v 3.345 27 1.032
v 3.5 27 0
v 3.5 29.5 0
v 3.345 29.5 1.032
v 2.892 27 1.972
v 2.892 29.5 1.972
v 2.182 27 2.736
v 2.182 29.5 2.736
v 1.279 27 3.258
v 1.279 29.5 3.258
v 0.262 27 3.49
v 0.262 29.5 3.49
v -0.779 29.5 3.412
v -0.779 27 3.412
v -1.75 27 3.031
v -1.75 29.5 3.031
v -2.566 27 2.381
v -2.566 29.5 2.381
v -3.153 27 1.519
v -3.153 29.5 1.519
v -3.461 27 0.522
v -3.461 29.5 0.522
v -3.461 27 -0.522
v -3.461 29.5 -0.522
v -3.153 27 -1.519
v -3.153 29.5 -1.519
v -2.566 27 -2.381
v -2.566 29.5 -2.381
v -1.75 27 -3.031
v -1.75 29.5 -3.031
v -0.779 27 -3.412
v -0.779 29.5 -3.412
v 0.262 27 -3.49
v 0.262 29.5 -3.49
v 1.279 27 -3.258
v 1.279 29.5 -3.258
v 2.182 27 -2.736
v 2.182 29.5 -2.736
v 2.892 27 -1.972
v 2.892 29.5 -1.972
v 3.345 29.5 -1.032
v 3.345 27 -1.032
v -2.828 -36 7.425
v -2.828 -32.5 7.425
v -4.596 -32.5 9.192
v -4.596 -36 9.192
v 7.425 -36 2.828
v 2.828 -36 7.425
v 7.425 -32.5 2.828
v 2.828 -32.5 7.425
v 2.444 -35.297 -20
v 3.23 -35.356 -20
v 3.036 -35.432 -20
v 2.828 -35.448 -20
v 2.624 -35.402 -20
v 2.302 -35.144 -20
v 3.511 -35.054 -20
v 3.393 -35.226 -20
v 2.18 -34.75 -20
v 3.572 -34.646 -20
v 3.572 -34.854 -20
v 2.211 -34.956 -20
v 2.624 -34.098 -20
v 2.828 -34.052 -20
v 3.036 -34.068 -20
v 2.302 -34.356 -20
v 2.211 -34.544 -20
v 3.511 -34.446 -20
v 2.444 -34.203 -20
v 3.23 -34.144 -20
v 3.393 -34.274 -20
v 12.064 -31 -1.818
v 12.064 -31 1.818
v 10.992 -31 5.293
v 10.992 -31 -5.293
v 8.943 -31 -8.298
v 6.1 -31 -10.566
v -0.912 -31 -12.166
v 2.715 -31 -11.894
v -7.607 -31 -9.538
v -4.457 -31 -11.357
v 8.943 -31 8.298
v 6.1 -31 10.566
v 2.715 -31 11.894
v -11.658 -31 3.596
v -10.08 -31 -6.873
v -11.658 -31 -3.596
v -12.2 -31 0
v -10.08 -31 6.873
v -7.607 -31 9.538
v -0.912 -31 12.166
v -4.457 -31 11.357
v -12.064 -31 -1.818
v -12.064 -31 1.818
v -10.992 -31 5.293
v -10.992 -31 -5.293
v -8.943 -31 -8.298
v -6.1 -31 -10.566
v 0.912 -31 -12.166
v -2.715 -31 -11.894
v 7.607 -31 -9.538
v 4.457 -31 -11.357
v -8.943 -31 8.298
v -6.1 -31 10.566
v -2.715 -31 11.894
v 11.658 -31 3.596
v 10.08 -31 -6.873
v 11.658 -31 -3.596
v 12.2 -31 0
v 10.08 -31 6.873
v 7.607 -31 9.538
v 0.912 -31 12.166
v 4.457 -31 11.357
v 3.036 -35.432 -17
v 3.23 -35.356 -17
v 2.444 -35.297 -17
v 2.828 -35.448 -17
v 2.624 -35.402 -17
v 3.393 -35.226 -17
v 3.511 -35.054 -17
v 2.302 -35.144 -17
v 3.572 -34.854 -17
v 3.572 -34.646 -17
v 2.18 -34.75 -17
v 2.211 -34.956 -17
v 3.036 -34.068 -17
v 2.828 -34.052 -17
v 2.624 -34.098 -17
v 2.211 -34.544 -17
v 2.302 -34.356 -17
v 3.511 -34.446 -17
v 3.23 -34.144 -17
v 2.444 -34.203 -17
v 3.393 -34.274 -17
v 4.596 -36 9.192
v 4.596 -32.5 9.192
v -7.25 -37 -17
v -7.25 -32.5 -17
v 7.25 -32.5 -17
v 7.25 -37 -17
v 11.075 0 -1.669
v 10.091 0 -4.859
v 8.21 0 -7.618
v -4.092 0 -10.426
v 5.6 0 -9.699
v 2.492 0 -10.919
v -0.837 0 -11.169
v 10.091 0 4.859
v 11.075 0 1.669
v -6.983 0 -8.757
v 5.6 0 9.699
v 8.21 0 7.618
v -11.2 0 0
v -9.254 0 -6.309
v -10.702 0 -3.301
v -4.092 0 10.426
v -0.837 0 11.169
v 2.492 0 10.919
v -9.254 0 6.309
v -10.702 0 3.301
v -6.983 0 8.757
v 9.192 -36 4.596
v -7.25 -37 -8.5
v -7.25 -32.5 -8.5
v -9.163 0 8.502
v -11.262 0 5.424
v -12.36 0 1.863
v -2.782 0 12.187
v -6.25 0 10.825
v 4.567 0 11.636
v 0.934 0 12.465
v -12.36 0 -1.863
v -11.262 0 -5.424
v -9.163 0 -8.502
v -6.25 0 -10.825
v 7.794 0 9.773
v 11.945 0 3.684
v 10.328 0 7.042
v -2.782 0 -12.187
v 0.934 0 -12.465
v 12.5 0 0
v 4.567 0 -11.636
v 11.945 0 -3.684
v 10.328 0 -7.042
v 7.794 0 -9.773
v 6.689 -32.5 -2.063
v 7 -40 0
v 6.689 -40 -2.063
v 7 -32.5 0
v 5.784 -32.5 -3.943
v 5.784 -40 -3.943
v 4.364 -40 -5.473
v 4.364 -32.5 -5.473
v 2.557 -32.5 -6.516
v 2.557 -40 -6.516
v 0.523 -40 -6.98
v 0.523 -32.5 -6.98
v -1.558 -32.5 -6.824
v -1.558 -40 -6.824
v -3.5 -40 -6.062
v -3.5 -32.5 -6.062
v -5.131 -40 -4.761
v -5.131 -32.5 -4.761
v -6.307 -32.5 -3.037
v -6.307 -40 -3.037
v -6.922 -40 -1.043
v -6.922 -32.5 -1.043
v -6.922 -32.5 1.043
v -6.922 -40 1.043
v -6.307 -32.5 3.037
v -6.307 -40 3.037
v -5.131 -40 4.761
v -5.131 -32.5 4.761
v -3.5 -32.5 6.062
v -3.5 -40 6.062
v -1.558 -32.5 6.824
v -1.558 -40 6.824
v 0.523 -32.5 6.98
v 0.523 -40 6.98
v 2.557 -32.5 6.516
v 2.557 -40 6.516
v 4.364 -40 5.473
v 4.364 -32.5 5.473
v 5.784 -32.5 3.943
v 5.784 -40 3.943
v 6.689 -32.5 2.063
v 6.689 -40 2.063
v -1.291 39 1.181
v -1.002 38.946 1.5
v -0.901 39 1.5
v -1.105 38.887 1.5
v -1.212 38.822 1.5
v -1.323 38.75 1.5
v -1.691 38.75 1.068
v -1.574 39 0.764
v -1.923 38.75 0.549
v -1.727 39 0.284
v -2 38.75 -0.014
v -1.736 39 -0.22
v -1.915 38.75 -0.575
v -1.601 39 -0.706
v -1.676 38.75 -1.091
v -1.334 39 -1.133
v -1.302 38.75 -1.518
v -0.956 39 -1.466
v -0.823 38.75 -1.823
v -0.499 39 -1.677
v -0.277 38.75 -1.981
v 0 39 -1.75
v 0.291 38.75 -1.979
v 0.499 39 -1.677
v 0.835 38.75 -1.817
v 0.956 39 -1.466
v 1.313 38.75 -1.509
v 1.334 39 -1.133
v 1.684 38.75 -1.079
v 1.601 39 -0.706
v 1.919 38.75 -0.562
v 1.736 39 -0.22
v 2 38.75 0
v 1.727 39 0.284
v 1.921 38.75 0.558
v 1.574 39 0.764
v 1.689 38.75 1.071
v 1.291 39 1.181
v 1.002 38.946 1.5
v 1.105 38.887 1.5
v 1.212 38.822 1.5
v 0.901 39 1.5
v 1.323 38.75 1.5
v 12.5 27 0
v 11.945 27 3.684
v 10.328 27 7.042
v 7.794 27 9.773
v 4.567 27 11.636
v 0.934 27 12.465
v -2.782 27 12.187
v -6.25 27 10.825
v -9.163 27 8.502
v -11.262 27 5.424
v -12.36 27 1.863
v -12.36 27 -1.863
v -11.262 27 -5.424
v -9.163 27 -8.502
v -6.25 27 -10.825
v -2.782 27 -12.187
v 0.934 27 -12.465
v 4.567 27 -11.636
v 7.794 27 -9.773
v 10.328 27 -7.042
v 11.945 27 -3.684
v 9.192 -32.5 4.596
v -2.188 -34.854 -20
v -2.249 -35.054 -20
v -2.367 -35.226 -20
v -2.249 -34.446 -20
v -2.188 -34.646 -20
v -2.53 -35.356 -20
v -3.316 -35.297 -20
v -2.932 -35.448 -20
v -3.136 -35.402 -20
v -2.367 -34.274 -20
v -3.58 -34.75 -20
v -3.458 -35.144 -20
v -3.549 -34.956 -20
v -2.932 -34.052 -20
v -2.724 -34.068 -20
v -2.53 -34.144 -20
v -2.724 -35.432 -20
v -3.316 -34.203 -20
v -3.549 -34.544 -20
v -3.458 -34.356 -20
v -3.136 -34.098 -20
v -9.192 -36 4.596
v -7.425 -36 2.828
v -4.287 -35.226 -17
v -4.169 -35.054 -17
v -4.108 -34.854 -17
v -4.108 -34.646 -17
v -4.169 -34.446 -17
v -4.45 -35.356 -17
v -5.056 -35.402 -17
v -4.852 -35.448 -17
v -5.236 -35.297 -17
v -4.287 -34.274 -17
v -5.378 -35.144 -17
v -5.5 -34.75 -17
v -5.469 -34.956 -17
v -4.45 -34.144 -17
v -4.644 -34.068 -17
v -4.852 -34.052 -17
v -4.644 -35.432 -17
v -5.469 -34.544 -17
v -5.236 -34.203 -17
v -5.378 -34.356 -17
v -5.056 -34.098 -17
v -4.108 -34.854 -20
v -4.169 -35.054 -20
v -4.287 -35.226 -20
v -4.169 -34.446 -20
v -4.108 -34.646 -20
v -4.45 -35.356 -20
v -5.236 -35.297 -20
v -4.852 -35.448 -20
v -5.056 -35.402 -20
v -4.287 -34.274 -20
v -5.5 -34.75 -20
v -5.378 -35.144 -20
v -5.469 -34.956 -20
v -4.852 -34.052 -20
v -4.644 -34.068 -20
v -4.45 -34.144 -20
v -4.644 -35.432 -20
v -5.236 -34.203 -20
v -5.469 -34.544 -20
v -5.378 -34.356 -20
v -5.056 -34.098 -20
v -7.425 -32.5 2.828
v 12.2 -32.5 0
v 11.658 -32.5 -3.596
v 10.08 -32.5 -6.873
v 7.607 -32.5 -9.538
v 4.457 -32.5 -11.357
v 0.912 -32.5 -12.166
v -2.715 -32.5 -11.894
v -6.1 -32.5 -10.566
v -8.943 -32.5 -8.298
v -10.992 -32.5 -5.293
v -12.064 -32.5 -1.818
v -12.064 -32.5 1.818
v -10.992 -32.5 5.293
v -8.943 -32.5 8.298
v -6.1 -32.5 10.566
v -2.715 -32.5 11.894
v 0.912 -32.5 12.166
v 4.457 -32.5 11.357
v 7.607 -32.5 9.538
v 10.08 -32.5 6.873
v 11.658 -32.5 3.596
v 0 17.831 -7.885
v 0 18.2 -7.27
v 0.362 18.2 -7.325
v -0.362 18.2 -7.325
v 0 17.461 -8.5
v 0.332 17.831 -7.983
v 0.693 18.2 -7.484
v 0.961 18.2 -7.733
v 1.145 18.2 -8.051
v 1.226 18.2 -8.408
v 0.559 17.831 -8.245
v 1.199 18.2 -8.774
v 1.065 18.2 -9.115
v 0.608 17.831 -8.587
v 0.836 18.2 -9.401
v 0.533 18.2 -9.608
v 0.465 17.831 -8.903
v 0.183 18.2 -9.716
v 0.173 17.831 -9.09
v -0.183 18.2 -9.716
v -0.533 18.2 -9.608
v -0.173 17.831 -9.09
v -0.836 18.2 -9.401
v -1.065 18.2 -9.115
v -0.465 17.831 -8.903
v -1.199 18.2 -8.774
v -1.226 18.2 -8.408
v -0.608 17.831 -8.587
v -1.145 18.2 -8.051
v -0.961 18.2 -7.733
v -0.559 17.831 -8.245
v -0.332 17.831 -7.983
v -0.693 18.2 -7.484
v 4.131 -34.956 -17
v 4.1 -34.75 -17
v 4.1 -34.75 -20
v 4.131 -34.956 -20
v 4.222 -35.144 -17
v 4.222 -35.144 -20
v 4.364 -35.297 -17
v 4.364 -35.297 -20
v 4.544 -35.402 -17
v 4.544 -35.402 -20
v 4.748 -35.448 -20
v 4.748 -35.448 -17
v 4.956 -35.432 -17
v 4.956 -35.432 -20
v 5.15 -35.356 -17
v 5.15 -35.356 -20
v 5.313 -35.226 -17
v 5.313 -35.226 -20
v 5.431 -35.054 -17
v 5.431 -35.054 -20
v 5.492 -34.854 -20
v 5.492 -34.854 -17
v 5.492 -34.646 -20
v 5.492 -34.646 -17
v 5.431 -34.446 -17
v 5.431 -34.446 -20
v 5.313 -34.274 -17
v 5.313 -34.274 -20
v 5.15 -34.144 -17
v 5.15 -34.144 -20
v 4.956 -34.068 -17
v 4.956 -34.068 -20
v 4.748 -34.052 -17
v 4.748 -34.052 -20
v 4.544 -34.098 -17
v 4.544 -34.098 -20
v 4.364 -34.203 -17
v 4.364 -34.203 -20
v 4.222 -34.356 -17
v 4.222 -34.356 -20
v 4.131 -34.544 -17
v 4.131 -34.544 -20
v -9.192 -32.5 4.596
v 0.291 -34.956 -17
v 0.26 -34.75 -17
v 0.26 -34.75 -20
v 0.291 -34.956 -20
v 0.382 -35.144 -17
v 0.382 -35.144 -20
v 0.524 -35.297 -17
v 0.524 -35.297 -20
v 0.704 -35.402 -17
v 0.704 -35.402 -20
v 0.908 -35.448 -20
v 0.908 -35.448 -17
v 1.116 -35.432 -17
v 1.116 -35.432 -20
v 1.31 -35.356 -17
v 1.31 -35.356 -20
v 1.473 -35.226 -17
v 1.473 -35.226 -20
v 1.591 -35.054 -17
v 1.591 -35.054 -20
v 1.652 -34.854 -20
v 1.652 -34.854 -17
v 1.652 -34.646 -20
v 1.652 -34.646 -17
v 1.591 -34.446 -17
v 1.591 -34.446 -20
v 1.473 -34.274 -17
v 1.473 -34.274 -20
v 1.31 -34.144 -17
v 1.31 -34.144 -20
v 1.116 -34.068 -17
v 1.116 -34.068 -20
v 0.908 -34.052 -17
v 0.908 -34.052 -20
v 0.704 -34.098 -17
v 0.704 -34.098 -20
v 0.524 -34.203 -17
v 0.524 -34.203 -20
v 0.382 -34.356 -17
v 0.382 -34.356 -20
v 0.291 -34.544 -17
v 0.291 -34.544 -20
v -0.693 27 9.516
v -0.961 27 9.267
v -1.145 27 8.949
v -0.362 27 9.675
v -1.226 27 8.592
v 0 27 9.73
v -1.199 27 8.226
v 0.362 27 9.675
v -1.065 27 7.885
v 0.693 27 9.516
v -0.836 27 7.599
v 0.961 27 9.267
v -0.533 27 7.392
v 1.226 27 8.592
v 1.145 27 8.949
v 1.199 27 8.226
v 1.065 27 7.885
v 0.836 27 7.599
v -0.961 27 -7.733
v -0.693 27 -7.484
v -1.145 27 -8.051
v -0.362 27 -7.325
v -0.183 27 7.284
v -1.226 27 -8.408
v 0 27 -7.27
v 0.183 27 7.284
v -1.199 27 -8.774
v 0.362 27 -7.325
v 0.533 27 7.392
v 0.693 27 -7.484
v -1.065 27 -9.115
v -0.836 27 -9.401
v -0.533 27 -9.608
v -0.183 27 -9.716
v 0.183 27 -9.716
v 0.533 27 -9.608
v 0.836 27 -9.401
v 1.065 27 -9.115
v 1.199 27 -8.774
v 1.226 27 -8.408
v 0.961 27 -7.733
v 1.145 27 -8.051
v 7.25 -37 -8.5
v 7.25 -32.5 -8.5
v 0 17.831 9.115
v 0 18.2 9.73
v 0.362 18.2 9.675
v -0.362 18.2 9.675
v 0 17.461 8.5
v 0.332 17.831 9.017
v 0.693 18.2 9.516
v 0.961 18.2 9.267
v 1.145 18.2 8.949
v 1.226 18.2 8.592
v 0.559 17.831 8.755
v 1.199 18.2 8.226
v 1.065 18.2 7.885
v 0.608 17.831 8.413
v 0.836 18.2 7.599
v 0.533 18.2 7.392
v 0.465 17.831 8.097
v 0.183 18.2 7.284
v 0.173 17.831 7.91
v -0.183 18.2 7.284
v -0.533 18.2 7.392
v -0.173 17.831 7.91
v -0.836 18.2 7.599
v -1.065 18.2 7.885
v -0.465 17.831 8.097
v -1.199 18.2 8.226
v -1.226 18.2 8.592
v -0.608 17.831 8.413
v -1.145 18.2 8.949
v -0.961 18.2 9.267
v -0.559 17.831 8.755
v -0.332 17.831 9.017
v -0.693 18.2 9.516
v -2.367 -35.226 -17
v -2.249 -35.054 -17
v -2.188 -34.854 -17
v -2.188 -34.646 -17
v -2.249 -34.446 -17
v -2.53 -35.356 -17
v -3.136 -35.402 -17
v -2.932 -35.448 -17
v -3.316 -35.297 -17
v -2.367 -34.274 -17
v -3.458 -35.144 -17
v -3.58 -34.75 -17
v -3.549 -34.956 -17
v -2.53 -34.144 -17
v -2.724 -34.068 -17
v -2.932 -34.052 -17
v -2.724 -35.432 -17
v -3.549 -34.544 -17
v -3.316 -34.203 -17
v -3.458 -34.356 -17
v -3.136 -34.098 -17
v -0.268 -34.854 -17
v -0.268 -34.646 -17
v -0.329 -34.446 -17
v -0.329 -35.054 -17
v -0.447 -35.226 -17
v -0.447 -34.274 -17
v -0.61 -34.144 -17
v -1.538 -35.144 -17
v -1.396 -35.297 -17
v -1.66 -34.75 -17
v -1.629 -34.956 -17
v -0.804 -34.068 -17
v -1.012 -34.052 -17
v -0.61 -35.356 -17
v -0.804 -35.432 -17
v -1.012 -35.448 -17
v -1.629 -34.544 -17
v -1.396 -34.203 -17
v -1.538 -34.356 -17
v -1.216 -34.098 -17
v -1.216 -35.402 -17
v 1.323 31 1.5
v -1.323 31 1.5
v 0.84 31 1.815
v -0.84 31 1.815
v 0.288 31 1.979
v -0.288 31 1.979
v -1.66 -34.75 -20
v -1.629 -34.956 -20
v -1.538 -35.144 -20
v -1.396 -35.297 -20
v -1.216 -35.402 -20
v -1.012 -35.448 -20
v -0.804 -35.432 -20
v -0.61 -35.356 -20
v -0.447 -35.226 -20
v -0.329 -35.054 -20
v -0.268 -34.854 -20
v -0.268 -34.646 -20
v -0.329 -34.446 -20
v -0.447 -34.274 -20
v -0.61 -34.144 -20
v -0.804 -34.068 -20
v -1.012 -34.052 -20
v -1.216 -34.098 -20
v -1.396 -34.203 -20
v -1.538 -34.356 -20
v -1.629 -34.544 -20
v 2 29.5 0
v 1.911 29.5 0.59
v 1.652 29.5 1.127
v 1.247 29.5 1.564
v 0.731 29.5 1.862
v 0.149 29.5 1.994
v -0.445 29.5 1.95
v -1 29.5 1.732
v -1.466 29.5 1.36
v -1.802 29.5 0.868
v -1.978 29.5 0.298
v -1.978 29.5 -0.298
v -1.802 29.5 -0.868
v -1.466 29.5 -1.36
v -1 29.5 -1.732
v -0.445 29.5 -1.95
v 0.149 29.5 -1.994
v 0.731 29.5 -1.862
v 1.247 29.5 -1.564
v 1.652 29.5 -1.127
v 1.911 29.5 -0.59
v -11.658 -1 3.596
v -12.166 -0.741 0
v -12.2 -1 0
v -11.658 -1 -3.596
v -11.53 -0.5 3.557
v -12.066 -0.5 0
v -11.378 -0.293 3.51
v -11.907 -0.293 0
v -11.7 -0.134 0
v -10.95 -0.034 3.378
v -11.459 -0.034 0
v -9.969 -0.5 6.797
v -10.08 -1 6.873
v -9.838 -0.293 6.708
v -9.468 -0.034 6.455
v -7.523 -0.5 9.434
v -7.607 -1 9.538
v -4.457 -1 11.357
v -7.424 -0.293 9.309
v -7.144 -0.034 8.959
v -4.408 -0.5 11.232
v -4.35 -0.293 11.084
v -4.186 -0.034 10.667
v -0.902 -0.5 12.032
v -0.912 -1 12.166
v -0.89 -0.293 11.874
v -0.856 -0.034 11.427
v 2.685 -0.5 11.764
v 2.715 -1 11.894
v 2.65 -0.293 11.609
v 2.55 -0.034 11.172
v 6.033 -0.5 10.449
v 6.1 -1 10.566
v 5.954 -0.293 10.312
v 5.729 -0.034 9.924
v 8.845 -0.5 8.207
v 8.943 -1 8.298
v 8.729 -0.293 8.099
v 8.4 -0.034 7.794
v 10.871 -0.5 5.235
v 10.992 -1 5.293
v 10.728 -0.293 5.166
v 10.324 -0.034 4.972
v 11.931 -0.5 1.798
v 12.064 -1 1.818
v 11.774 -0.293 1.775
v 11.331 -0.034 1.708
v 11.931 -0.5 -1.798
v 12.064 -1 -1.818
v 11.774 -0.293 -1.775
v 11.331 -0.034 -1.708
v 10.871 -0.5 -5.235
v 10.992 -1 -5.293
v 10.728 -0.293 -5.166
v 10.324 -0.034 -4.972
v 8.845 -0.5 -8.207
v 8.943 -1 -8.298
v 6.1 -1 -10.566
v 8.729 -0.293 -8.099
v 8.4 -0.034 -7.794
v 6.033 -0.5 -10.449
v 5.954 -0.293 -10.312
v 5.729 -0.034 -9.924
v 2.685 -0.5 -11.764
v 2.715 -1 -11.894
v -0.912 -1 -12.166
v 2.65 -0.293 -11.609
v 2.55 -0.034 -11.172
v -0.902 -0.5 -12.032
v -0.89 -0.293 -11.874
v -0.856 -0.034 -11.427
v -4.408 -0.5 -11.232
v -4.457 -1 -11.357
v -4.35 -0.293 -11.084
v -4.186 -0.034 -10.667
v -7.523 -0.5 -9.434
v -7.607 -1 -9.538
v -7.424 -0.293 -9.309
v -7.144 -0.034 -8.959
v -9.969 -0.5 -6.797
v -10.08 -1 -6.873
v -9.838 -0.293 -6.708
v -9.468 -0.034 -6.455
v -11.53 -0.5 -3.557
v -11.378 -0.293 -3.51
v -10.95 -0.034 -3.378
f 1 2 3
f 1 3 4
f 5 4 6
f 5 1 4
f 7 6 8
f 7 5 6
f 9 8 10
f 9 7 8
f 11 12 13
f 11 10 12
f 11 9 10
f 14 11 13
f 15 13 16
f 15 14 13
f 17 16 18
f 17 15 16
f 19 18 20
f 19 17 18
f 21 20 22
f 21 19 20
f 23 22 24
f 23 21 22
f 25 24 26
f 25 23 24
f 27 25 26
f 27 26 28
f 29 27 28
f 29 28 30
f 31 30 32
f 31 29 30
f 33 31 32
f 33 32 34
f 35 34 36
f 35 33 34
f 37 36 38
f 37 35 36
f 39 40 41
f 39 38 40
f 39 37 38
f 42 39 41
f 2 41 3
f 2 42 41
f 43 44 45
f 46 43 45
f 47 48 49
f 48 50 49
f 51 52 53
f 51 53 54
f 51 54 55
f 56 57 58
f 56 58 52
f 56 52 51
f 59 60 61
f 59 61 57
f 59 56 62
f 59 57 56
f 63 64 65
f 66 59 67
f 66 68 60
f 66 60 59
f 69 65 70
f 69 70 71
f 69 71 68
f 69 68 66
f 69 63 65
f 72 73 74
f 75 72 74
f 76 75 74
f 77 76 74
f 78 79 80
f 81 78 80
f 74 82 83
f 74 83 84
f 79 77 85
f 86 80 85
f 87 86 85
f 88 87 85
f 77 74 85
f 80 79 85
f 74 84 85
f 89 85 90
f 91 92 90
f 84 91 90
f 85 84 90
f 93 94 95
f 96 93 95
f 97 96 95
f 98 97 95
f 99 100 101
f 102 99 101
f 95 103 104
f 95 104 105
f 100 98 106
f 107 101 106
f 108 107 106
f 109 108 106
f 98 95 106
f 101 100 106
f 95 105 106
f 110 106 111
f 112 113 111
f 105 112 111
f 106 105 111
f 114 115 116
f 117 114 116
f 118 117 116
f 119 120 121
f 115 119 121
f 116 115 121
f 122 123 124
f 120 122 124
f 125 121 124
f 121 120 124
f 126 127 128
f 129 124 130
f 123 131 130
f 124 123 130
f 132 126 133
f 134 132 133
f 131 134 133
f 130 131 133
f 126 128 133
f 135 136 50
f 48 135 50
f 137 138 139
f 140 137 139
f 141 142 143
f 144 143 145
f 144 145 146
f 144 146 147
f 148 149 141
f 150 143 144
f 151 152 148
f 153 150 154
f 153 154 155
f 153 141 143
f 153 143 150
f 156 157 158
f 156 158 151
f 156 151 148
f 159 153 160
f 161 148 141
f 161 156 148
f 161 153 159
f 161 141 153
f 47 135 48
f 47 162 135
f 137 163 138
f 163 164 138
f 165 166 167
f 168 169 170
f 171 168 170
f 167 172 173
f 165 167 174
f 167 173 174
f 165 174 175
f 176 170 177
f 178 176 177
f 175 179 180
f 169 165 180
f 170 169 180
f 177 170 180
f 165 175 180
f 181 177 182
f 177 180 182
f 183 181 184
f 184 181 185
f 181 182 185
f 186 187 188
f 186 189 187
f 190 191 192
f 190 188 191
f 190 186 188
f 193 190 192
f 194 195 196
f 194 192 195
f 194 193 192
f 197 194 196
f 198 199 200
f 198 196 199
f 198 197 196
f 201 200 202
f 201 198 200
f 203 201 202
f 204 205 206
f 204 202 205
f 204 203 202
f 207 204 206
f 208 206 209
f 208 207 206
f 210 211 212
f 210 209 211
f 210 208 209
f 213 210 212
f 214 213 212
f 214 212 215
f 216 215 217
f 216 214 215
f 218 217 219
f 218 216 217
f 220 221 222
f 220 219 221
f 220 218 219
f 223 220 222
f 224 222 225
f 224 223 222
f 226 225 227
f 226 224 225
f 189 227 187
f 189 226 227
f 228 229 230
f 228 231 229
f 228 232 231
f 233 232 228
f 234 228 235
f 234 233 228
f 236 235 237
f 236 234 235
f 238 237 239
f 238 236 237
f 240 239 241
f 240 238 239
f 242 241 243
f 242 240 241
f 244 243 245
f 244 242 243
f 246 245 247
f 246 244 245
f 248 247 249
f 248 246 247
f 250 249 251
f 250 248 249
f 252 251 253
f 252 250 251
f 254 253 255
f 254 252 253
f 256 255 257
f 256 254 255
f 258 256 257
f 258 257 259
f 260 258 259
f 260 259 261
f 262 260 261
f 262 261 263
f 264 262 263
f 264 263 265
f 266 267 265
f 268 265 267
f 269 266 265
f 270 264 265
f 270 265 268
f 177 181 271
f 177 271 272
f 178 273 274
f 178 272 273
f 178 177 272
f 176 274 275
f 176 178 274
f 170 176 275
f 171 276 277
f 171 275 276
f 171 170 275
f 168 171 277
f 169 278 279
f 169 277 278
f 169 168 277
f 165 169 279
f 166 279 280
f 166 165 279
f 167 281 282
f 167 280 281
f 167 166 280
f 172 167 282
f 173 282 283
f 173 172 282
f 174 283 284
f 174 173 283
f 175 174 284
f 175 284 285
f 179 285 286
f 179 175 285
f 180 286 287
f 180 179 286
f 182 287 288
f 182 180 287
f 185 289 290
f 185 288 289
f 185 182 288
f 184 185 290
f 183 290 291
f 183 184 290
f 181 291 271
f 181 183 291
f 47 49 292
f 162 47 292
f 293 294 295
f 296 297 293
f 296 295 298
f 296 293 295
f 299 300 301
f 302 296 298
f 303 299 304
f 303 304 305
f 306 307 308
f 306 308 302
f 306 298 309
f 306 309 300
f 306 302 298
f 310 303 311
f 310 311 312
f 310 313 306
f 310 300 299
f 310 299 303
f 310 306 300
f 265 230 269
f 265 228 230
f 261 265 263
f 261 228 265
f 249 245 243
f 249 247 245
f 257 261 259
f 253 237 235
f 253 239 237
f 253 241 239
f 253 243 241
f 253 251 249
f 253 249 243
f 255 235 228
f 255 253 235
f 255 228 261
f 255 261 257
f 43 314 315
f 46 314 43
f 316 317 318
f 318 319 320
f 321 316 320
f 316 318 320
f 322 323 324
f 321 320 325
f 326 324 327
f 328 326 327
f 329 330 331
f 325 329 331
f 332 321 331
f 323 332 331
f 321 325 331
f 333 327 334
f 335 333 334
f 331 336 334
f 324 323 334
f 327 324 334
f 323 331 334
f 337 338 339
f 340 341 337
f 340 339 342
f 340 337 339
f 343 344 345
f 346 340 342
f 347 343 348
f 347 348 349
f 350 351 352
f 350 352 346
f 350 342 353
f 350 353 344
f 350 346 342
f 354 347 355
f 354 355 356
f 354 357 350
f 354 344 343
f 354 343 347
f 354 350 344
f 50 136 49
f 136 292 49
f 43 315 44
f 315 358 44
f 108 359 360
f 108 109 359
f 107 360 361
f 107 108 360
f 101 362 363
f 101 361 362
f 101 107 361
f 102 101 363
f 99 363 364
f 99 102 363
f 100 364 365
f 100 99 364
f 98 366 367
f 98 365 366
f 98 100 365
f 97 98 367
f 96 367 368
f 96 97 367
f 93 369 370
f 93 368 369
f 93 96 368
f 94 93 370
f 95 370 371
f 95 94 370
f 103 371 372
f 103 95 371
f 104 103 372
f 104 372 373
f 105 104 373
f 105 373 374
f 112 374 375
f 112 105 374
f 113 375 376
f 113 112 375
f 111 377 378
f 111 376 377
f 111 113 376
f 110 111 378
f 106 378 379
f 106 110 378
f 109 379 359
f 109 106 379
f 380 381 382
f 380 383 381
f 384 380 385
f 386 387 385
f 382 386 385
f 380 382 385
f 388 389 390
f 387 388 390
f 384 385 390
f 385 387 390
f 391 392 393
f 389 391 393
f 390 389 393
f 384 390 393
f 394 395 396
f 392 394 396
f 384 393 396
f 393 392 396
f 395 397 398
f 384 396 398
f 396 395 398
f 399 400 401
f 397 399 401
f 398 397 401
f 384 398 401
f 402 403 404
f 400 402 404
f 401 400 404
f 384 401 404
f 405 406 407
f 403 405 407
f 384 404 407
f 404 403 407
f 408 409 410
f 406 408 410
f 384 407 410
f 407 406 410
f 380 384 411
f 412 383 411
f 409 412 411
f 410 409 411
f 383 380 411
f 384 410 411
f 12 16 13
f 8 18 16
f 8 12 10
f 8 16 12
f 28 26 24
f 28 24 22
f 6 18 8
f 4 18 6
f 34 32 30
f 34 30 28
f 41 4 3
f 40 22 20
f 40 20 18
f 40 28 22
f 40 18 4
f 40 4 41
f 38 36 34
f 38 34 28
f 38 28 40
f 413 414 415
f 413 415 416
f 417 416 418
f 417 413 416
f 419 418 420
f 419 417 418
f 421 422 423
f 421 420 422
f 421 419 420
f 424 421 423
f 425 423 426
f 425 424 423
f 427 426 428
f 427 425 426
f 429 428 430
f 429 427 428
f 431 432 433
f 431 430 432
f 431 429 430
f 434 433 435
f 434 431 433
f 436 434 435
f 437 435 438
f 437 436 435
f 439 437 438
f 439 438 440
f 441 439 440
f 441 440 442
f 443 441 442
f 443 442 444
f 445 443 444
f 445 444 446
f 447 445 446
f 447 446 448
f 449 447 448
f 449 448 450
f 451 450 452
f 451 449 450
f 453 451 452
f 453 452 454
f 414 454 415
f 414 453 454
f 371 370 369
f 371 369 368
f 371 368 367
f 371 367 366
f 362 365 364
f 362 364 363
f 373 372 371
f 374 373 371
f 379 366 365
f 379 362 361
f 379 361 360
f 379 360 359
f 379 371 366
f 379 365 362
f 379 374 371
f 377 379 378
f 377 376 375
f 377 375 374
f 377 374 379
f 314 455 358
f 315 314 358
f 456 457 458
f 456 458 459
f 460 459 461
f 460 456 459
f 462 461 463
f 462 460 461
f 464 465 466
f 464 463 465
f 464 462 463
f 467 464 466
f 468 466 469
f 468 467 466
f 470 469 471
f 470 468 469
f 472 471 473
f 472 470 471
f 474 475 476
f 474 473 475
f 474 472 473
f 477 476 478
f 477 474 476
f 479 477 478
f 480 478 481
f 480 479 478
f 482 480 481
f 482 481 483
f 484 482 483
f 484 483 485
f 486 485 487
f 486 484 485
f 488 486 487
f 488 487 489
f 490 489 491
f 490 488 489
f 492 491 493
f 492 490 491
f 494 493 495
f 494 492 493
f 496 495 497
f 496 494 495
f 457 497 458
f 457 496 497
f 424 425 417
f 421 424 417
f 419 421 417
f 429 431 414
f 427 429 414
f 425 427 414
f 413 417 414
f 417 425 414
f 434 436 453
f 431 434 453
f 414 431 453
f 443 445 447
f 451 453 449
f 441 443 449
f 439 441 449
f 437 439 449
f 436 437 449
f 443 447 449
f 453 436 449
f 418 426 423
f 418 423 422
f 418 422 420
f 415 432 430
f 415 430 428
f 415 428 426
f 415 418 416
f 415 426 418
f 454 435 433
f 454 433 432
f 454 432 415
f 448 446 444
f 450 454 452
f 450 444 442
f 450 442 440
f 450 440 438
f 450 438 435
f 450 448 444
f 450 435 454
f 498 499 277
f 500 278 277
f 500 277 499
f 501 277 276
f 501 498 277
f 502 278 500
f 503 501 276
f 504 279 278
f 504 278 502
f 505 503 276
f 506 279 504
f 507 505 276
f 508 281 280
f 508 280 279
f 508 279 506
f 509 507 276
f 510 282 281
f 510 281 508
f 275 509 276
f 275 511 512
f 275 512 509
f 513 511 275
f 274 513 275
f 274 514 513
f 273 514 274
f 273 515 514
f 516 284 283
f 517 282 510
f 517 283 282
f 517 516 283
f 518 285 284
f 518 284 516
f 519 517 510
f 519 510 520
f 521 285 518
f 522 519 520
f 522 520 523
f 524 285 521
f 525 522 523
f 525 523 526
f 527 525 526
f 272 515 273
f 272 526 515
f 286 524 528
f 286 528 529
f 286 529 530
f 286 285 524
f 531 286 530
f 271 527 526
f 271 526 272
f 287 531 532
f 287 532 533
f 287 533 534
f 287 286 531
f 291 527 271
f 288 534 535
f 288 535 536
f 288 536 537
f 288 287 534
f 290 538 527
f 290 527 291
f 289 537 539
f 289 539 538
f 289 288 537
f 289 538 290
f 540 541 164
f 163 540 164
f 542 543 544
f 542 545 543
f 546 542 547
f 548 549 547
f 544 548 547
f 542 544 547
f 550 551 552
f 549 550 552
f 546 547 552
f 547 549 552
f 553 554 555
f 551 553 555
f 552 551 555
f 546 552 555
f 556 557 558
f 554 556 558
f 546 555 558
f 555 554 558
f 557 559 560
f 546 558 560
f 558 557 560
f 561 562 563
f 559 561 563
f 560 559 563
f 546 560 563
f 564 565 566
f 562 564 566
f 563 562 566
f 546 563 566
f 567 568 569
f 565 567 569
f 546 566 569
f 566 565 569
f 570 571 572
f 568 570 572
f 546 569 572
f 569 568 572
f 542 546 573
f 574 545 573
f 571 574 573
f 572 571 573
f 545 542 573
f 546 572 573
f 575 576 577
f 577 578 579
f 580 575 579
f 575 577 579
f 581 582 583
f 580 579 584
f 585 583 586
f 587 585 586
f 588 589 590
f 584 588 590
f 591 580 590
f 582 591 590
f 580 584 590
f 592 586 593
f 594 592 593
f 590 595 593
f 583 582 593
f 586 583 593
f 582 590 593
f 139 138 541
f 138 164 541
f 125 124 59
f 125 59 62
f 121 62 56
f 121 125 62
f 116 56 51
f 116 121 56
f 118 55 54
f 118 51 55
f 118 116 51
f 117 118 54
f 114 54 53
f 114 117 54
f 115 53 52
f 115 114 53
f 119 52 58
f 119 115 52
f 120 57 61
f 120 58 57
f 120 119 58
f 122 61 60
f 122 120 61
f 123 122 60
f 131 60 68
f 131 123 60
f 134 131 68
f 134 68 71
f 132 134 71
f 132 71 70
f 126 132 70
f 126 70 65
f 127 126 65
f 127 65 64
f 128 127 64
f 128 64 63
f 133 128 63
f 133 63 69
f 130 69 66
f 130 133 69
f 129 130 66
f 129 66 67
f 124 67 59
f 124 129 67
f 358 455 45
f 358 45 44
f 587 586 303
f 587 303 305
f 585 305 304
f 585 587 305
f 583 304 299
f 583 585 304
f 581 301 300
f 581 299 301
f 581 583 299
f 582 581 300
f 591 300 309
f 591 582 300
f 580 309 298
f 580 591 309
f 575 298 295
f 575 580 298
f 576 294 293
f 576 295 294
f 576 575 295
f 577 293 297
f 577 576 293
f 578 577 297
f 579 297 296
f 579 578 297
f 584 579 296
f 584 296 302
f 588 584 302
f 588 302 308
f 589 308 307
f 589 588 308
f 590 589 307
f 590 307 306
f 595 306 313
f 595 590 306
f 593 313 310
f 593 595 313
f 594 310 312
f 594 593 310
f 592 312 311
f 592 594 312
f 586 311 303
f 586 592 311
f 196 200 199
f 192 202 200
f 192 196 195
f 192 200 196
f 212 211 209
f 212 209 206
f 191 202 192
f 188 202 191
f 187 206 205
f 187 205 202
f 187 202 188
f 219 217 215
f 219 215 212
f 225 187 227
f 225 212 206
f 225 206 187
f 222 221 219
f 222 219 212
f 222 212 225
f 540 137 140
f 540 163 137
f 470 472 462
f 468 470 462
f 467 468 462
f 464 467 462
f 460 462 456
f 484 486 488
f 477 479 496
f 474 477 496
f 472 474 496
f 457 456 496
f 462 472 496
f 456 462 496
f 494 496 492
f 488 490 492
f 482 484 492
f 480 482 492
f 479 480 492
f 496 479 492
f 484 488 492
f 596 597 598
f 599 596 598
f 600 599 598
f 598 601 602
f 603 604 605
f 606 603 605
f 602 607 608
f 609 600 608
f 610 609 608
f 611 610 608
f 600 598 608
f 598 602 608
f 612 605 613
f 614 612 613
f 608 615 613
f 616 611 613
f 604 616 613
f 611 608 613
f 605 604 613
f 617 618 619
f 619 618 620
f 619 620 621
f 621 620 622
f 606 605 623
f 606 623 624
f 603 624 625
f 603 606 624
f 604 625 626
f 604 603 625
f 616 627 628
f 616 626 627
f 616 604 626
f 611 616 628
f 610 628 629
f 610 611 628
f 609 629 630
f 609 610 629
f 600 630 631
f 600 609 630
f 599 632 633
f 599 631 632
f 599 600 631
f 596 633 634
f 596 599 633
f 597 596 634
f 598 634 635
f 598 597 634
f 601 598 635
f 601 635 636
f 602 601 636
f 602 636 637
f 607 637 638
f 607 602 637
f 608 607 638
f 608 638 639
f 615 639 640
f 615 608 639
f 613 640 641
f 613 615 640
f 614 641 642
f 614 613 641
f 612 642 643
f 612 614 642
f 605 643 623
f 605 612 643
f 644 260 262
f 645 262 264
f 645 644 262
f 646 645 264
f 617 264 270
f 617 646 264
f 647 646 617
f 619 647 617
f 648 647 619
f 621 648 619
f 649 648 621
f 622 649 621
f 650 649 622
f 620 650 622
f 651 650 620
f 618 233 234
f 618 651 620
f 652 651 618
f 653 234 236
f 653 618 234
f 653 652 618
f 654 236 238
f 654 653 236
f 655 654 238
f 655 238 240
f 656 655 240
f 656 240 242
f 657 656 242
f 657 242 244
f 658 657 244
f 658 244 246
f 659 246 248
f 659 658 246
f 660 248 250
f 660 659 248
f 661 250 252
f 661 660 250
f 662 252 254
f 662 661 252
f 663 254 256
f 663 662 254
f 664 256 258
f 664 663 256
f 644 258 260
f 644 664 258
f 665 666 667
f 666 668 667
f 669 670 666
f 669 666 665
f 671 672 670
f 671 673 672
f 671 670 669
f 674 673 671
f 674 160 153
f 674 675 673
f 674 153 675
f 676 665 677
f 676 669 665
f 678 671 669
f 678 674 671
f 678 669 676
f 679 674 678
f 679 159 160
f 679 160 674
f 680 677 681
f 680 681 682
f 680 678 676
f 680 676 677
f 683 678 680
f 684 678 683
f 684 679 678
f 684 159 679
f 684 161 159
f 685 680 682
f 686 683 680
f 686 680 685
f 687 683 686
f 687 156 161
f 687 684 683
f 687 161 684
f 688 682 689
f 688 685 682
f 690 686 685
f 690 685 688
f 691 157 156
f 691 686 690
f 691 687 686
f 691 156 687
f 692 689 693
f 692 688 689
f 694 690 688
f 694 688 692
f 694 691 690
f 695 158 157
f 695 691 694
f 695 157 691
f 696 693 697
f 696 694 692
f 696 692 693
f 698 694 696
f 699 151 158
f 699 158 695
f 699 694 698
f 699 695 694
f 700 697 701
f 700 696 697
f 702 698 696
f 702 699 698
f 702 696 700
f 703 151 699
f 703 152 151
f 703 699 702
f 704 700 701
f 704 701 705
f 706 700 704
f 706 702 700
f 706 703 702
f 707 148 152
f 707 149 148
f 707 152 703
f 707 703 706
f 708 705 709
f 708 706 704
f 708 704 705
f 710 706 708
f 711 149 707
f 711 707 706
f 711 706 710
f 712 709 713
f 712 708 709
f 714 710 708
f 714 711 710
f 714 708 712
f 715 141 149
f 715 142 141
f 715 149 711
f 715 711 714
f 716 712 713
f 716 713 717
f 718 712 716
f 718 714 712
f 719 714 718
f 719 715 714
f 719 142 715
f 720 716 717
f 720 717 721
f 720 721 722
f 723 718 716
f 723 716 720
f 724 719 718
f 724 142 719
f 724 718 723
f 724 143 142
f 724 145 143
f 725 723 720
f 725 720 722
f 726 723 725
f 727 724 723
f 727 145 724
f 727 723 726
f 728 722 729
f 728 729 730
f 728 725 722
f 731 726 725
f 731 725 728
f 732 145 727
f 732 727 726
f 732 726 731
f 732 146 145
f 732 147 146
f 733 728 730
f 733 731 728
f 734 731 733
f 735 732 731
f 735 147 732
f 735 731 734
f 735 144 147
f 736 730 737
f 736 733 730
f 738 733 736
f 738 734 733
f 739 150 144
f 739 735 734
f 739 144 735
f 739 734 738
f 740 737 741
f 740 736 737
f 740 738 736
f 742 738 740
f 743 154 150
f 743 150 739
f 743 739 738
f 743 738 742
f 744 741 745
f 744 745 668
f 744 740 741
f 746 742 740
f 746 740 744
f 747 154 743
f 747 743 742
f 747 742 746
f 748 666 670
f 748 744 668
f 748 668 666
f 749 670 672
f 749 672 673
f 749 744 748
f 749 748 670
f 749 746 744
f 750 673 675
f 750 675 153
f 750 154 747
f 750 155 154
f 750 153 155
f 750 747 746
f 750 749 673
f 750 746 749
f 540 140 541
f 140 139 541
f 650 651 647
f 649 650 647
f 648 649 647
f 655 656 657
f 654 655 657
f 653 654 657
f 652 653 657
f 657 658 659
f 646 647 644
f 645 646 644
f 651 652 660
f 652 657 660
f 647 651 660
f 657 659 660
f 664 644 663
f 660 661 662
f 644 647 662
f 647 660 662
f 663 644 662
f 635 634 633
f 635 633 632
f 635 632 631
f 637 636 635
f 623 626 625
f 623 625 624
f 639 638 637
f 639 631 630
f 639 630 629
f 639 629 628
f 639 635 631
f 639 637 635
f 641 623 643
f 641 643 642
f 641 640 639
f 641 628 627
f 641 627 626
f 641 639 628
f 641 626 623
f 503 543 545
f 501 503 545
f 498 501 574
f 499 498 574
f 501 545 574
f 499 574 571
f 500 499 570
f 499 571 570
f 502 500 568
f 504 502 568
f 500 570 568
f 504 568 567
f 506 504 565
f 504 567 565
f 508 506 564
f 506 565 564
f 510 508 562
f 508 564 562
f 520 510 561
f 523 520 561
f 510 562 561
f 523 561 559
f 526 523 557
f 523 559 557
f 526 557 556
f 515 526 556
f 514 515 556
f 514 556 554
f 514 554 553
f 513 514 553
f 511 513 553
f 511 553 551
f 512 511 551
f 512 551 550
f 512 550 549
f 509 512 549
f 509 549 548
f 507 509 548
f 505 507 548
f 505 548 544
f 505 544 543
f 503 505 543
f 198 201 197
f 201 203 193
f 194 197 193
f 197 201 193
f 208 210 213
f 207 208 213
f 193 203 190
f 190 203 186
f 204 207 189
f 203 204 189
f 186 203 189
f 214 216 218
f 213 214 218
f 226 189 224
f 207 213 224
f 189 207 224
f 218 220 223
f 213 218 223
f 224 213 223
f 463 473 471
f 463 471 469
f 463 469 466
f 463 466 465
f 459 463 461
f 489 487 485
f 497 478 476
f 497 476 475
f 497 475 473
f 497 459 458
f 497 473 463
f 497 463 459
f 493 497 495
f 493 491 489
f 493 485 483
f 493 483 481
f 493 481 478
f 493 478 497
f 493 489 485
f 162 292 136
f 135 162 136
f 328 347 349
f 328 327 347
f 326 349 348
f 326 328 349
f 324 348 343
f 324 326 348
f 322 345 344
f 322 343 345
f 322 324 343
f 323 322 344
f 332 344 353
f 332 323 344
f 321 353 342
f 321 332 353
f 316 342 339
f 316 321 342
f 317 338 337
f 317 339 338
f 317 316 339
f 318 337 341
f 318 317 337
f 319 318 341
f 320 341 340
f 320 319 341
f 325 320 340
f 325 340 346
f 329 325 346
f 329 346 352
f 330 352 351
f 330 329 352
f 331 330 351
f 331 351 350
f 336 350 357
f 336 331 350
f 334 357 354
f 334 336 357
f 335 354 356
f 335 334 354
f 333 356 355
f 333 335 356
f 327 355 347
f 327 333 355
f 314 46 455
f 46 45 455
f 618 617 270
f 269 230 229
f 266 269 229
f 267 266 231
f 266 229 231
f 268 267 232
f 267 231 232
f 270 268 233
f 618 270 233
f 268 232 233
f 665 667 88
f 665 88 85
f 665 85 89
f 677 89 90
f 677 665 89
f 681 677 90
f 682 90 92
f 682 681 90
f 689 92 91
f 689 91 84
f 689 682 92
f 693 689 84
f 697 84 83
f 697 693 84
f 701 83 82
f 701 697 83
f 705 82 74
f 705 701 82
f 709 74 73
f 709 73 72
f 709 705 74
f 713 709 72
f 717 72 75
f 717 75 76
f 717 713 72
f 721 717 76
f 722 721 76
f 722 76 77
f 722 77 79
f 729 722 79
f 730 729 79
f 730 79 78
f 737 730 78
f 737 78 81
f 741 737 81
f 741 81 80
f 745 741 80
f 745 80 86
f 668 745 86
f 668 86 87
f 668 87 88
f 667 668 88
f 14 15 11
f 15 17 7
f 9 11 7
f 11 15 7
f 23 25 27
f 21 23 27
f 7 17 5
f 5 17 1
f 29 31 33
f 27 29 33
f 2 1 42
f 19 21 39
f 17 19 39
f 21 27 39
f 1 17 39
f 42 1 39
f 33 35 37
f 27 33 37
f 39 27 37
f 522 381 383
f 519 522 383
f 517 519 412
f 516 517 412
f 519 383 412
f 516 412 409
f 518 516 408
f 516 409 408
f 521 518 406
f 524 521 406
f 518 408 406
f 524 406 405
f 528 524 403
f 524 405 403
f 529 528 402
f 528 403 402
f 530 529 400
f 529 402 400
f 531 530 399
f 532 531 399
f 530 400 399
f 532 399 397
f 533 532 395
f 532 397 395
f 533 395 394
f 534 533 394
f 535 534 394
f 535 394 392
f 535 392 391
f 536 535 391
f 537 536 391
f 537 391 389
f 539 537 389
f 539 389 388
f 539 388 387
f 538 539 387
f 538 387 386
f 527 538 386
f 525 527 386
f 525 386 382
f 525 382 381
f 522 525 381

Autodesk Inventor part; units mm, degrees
ref_plane "YZ Plane" through (0, 0, 0) normal (1, 0, 0) x (0, 1, 0)
ref_plane "XZ Plane" through (0, 0, 0) normal (0, 1, 0) x (-1, 0, 0)
ref_plane "XY Plane" through (0, 0, 0) normal (0, 0, 1) x (1, 0, 0)
sketch "Sketch1" plane through (0, 0, 0) normal (0, 1, 0) x (-1, 0, 0)
  circle A0 centre (0, 0) radius 12.2
  dimension "d0" = 24.4
extrude "Extrusion1" add sketch "Sketch1" against normal blind 31
fillet "Fillet1" radius 1 1 edges at (12.2, 0, 0)
sketch "Sketch2" plane through (0, -31, 0) normal (0, -1, 0) x (1, 0, 0)
  circle A0 centre (0, 0) radius 12.2 projected
extrude "Extrusion2" add sketch "Sketch2" along normal blind 1.5 separate body
sketch "Sketch3" plane through (0, -32.5, 0) normal (0, -1, 0) x (1, 0, 0)
  circle A0 centre (0, 0) radius 7
  dimension "d6" = 14
extrude "Extrusion3" add sketch "Sketch3" along normal blind 7.5 separate body
sketch "Sketch4" plane through (0, -32.5, 0) normal (0, -1, 0) x (1, 0, 0)
  circle A0 centre (0, 0) radius 6.75 construction
  line L0 (-7.4246, 2.8284) -> (-2.8284, 7.4246)
  line L1 (-2.8284, 7.4246) -> (-4.5962, 9.1924)
  line L2 (-4.5962, 9.1924) -> (-9.1924, 4.5962)
  line L3 (-9.1924, 4.5962) -> (-7.4246, 2.8284)
  line L4 (-7.4246, 2.8284) -> (-4.5962, 9.1924) construction
  line L5 (-2.8284, 7.4246) -> (-9.1924, 4.5962) construction
  line L6 (0, 0) -> (-6.0104, 6.0104) construction
  line L7 (0, 0) -> (-12.2, 0) construction
  circle A1 centre (0, 0) radius 12.2 construction
  point P0 (4.773, -4.773)
  dimension "d9" = 13.5
  dimension "d10" = 6.5
  dimension "d11" = 2.5
  dimension "d12" = 45
  dimension "d13" = 16.5
extrude "Extrusion4" add sketch "Sketch4" along normal blind 3.5 separate body
pattern_circular "Circular Pattern1" count 2 over 90 about axis through (0, -32.5, 0) along (0, 1, 0) of "Extrusion4" bodies 4
sketch "Sketch5" plane through (0, -32.5, 0) normal (0, -1, 0) x (1, 0, 0)
  line L0 (-7.25, -17) -> (7.25, -17)
  line L1 (7.25, -17) -> (7.25, -8.5)
  line L2 (7.25, -8.5) -> (-7.25, -8.5)
  line L3 (-7.25, -8.5) -> (-7.25, -17)
  line L4 (-7.25, -17) -> (7.25, -8.5) construction
  line L5 (7.25, -17) -> (-7.25, -8.5) construction
  circle A0 centre (0, 0) radius 7 projected
  point P0 (0, -12.75)
  point P1 (0, -12.75)
  dimension "d19" = 17
  dimension "d20" = 8.5
  dimension "d21" = 14.5
extrude "Extrusion5" add sketch "Sketch5" along normal blind 4.5 separate body contours L3 L2 L1 L0
sketch "Sketch6" plane through (7.25, -32.5, -17) normal (0, 0, -1) x (-1, 0, 0)
  line L0 (12.05, -2.25) -> (10.13, -2.25) construction
  line L1 (10.13, -2.25) -> (8.21, -2.25) construction
  line L2 (8.21, -2.25) -> (6.29, -2.25) construction
  line L3 (6.29, -2.25) -> (4.37, -2.25) construction
  line L4 (4.37, -2.25) -> (2.45, -2.25) construction
  circle A0 centre (12.05, -2.25) radius 0.7
  circle A1 centre (10.13, -2.25) radius 0.7
  circle A2 centre (8.21, -2.25) radius 0.7
  circle A3 centre (6.29, -2.25) radius 0.7
  circle A4 centre (4.37, -2.25) radius 0.7
  circle A5 centre (2.45, -2.25) radius 0.7
  line L5 (14.5, 0) -> (14.5, -4.5) projected
  line L6 (14.5, -4.5) -> (0, -4.5) projected
  point P0 (7.25, 32.5)
  point P1 (14.5, -2.25)
  point P2 (7.25, -2.25)
  point P3 (7.25, -4.5)
  dimension "d24" = 9.6
  dimension "d25" = 1.4
extrude "Extrusion6" add sketch "Sketch6" along normal blind 3 separate body contours A0
extrude "Extrusion7" add sketch "Sketch6" along normal blind 3 separate body contours A1
extrude "Extrusion8" add sketch "Sketch6" along normal blind 3 separate body contours A2
extrude "Extrusion9" add sketch "Sketch6" along normal blind 3 separate body contours A3
extrude "Extrusion10" add sketch "Sketch6" along normal blind 3 separate body contours A4
extrude "Extrusion11" add sketch "Sketch6" along normal blind 3 separate body contours A5
sketch "Sketch7" plane through (0, 0, 0) normal (0, 1, 0) x (1, 0, 0)
  circle A0 centre (0, 0) radius 12.5
  dimension "d38" = 25
extrude "Extrusion12" add sketch "Sketch7" along normal blind 27 separate body
sketch "Sketch8" plane through (0, 27, 0) normal (0, 1, 0) x (1, 0, 0)
  circle A0 centre (0, 0) radius 11.2 construction
  circle A1 centre (0, 0) radius 3.5
  dimension "d41" = 7
extrude "Extrusion13" add sketch "Sketch8" along normal blind 2.5 separate body
sketch "Sketch9" plane through (0, 29.5, 0) normal (0, 1, 0) x (1, 0, 0)
  circle A0 centre (0, 0) radius 2
  dimension "d44" = 4
extrude "Extrusion14" add sketch "Sketch9" along normal blind 9.5 separate body
chamfer "Chamfer1" distance 0.25 angle 45 1 edges at (-2, 39, 0)
sketch "Sketch10" plane through (0, 39, 0) normal (0, 1, 0) x (1, 0, 0)
  line L0 (-1.3229, -2) -> (1.3229, -2)
  line L1 (1.3229, -2) -> (1.3229, -1.5)
  line L2 (1.3229, -1.5) -> (-1.3229, -1.5)
  line L3 (-1.3229, -1.5) -> (-1.3229, -2)
  circle A0 centre (0, 0) radius 2 construction
  dimension "d50" = 1.5
extrude "Extrusion15" cut sketch "Sketch10" against normal blind 8 bodies 14
sketch "Sketch11" plane through (0, 27, 0) normal (0, 1, 0) x (1, 0, 0)
  circle A0 centre (0, 0) radius 12.5 construction
  line L0 (0, 8.5) -> (0, -8.5) construction
  line L1 (7.25, 8.5) -> (-7.25, 8.5) construction
  dimension "d53" = 17
hole "Hole1" at (0, 27, -8.5) at (0, 27, 8.5) direction (0, -1, 0) diameter 2.459 depth 8.8 tip angle 118 bodies 12 thread size "M3x0.5" class "6H" standard "ISO Metric profile"
properties part number "JGA25-371_12VDC_20RPM"
